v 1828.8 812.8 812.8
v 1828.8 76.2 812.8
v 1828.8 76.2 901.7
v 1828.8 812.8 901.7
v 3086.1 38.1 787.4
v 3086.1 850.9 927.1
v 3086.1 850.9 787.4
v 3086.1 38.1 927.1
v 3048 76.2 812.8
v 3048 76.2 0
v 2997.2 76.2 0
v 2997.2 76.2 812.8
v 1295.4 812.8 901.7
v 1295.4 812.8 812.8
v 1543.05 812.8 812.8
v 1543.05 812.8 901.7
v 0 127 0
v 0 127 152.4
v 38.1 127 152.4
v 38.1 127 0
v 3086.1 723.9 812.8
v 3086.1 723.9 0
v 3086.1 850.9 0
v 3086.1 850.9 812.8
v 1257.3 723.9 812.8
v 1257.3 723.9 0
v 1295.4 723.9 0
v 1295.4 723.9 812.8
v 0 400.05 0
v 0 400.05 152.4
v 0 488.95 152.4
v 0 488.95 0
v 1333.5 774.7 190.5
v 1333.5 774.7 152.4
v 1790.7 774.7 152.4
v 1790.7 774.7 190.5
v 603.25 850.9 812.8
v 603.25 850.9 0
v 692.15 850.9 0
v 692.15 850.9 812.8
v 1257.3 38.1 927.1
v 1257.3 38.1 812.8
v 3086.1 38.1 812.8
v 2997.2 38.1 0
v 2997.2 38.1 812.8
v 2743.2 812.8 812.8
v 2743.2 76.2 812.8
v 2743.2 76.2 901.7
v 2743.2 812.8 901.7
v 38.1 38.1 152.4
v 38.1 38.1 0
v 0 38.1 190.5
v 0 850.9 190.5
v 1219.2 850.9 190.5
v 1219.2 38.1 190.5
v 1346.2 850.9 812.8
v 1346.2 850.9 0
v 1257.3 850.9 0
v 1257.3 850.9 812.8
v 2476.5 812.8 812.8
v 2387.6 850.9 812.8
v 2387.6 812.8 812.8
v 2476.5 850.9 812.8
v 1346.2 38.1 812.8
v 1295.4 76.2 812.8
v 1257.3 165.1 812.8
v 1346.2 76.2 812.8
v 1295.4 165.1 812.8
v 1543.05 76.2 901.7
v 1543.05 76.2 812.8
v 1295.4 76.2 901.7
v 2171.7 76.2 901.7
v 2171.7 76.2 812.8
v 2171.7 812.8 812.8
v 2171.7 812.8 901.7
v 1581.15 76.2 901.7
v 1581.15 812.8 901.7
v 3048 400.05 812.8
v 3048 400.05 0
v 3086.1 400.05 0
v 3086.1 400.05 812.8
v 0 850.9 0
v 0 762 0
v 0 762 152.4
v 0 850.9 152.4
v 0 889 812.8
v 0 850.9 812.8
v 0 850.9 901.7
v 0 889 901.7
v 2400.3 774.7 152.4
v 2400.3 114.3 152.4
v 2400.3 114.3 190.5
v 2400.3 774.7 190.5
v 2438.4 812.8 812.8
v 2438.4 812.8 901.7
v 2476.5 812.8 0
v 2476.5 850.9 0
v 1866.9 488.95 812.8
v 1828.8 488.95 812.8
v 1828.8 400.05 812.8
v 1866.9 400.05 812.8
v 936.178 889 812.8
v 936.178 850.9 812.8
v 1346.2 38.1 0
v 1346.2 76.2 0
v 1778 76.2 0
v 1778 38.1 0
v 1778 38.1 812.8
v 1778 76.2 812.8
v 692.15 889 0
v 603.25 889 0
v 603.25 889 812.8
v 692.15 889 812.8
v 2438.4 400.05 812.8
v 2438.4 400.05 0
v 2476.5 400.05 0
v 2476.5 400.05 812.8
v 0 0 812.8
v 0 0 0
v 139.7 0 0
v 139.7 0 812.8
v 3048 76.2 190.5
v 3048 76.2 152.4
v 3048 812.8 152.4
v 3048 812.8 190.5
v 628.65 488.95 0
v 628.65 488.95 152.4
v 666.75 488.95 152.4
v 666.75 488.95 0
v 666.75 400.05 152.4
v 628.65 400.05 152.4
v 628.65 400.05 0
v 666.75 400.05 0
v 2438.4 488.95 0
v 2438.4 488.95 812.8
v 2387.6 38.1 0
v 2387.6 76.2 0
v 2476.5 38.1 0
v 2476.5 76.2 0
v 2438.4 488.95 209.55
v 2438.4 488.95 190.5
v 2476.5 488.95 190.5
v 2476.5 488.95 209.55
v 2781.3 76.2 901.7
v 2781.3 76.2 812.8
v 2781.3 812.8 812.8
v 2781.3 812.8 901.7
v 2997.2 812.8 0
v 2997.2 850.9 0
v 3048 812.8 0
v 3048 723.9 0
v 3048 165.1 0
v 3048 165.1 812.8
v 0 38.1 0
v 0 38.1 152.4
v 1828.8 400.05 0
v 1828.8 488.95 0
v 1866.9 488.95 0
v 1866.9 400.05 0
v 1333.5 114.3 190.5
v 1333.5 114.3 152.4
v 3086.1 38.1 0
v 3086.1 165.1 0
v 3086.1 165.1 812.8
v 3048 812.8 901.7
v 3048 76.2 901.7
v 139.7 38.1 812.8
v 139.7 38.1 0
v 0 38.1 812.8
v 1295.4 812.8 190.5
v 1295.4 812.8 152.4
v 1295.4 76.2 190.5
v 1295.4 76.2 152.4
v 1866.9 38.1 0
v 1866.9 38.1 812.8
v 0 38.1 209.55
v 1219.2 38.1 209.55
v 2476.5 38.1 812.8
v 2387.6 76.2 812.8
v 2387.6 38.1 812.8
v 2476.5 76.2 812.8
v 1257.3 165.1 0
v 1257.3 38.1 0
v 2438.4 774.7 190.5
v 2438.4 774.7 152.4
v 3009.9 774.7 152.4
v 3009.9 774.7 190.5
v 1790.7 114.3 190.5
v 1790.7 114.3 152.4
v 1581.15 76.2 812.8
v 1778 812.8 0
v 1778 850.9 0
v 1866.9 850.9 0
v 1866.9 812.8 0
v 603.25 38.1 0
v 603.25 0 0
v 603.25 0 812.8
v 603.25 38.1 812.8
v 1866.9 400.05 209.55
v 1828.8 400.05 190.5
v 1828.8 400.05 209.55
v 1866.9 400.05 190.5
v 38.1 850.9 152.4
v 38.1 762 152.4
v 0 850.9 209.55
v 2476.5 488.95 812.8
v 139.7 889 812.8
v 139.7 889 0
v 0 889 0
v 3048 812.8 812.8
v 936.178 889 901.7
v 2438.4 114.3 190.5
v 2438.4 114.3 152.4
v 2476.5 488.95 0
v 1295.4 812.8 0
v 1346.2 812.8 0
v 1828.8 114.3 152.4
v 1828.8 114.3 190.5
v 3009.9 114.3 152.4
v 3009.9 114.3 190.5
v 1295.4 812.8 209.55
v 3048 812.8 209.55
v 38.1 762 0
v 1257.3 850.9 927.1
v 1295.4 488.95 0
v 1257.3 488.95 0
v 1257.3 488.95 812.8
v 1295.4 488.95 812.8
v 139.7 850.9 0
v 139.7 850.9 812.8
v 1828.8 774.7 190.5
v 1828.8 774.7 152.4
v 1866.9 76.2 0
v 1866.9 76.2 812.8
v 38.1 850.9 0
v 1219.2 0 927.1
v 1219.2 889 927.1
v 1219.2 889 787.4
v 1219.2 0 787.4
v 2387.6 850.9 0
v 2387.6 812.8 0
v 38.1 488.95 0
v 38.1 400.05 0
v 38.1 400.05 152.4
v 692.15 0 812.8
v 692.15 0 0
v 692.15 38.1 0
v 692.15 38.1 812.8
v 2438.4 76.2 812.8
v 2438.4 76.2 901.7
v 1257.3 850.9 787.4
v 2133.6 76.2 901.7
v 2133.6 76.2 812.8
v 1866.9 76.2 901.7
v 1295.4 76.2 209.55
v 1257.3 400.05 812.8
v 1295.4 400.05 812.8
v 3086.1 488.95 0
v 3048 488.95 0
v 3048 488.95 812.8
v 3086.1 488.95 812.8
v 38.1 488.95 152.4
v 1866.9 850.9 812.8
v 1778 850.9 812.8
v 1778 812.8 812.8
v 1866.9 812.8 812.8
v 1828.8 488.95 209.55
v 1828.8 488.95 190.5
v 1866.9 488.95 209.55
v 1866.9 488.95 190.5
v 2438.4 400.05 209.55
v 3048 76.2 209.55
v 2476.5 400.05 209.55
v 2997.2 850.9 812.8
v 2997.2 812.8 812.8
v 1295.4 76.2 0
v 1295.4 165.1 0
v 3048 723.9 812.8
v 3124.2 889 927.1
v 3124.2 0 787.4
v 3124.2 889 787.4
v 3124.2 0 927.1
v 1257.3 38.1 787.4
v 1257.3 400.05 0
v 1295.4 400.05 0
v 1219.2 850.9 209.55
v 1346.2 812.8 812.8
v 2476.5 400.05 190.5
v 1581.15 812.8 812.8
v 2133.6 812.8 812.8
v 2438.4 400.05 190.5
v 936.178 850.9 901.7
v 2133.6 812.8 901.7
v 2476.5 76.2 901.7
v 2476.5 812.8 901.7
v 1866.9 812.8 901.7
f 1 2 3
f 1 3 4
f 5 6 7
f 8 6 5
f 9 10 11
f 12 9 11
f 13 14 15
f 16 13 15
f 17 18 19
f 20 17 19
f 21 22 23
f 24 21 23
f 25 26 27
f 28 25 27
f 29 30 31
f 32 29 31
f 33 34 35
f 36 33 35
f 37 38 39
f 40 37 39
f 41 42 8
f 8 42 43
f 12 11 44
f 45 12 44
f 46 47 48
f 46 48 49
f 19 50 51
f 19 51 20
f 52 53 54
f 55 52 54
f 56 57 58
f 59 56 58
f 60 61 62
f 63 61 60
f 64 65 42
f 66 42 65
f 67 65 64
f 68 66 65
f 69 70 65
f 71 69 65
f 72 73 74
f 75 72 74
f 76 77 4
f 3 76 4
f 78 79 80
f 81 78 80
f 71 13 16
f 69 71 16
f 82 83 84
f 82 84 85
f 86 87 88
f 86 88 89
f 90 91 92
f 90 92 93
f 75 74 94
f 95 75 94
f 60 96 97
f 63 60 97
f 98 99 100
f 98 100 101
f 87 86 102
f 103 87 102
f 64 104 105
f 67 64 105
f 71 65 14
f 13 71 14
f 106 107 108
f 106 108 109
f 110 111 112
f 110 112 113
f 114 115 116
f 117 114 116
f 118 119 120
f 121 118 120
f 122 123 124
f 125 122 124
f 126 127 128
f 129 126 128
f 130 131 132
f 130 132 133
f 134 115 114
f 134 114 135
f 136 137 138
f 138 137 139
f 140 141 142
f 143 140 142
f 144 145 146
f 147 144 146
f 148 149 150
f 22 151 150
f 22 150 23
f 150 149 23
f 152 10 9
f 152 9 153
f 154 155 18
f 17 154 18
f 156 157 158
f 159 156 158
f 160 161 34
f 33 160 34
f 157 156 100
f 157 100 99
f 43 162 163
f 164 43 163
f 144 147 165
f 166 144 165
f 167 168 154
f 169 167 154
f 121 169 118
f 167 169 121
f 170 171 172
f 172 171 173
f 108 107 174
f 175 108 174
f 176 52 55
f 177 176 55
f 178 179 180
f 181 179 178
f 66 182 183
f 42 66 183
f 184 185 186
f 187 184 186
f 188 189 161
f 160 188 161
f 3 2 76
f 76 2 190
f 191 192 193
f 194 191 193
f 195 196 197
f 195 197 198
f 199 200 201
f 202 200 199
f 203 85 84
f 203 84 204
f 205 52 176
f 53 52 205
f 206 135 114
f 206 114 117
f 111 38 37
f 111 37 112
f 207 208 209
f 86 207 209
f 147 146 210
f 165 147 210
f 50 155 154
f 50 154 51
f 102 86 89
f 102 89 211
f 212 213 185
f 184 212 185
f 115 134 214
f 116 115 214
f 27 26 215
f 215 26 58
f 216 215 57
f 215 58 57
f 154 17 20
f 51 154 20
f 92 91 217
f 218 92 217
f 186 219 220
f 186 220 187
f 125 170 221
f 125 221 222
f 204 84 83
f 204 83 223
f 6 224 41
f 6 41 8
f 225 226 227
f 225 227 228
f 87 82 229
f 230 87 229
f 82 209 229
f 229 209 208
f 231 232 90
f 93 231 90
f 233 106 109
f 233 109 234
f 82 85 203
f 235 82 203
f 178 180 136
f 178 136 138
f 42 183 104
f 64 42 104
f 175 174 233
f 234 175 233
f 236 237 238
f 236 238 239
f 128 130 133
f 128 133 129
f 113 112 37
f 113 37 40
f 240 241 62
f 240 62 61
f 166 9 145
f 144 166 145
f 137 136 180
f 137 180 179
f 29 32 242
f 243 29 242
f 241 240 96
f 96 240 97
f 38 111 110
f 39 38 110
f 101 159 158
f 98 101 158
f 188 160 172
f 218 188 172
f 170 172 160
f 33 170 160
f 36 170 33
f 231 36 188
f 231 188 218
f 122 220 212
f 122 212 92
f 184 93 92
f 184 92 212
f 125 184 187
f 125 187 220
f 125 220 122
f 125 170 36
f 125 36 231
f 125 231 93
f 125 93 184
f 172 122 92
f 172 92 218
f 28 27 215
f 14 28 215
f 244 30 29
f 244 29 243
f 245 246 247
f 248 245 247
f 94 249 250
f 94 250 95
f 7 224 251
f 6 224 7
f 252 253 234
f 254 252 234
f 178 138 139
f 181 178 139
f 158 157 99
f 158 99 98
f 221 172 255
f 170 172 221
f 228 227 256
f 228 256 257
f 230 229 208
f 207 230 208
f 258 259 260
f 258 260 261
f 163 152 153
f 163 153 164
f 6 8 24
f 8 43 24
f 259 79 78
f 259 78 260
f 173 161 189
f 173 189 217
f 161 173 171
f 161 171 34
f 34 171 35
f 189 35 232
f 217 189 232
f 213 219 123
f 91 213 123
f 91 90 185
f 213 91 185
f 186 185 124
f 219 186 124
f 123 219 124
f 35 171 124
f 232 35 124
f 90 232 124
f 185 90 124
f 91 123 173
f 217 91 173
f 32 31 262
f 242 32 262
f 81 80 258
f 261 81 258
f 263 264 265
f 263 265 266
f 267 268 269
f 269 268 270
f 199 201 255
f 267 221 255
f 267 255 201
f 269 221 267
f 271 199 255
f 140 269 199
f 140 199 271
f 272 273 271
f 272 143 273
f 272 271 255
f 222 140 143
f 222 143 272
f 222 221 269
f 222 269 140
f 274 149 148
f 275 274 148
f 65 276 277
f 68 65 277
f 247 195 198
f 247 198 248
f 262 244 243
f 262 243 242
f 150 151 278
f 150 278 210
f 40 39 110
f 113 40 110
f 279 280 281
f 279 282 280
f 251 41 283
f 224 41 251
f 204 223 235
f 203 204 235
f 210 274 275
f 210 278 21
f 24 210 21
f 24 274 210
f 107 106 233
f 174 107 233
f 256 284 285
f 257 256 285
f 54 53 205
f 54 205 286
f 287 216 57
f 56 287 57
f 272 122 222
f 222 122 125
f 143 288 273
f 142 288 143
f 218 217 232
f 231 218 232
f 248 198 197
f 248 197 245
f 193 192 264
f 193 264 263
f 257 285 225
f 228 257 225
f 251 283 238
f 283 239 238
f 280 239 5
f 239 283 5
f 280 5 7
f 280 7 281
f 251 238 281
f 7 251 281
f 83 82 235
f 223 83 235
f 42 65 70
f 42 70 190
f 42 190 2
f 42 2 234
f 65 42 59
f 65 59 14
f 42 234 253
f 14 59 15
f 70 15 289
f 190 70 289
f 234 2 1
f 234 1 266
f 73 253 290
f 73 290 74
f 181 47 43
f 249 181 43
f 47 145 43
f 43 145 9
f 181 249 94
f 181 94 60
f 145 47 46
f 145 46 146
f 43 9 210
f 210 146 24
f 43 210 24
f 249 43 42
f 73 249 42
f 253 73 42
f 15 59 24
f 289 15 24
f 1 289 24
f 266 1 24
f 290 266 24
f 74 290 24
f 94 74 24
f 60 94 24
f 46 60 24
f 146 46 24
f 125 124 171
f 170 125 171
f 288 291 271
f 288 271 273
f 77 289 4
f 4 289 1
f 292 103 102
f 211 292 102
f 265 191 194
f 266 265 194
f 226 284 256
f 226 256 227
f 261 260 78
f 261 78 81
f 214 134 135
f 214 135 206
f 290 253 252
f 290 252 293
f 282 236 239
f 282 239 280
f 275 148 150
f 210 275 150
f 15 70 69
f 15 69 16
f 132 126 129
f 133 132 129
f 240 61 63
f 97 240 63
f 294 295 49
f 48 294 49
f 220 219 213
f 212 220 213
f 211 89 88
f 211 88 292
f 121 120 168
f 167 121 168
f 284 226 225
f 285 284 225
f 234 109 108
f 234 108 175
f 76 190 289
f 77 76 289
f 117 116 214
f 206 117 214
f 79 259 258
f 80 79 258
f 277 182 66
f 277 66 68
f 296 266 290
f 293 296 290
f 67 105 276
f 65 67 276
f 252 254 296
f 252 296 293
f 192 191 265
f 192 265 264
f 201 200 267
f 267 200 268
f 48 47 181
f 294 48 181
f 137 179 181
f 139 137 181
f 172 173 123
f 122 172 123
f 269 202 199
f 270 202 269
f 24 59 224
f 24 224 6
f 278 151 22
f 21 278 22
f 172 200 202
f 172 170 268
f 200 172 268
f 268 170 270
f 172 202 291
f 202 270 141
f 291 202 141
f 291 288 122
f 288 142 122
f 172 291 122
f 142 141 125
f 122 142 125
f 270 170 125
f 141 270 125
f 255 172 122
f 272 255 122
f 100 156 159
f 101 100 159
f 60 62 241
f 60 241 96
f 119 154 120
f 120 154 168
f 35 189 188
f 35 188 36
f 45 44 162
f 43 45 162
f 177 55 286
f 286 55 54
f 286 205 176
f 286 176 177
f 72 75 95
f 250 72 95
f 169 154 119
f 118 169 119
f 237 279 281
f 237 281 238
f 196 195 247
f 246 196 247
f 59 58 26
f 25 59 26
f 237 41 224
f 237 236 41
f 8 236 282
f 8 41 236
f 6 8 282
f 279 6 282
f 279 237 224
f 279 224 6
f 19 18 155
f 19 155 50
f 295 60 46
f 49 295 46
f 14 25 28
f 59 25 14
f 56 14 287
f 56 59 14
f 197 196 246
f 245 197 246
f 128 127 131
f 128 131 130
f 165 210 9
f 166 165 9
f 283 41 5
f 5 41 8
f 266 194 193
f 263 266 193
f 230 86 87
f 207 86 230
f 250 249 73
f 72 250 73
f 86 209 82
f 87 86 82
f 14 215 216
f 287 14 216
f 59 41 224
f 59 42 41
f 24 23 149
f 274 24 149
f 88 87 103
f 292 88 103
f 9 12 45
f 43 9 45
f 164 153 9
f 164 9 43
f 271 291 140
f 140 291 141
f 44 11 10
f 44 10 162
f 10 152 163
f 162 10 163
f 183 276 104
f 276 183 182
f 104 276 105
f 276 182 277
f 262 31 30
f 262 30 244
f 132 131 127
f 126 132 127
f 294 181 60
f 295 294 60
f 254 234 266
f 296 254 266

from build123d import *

# Parameters (mm, degrees)
F2_W           = 88.9
F2_H           = 38.1
F3_DEPTH       = 812.8
F2_W_2         = 38.1
F2_H_2         = 88.9
F4_DEPTH       = 152.4
F5_W           = 38.1
F5_H           = 660.4
F6_DEPTH       = 38.1
F7_W           = 1752.6
F7_H           = 736.6
F7_W_2         = 38.1
F7_H_2         = 88.9
F8_DEPTH       = 19.05
F7_W_3         = 1219.2
F7_H_3         = 812.8
F9_W           = 38.1
F9_H           = 736.6
F10_DEPTH      = 88.9
F9_W_2         = 936.1780285835
F9_H_2         = 38.1
F11_W          = 1828.8
F11_H          = 38.1
F12_DEPTH      = 25.4
F12_DEPTH_BACK = 114.3
F13_W          = 1828.8
F13_H          = 812.8
F14_DEPTH      = 19.05
F15_W          = 1828.8
F15_H          = 812.8
F16_DEPTH      = 6.35


# Not quite as in the source:
# - a feature names something its author has since deleted; it is built from what else it names


with BuildPart() as f3:
    # F2 (on Top) → F3 (new body)
    with BuildSketch(Plane.XY):
        with Locations((2432.05, 831.85)):
            Rectangle(F2_W, F2_H)
    extrude(amount=F3_DEPTH)


with BuildPart() as f3b:
    # F2 (on Top) → F3, piece 2 (new body)
    with BuildSketch(Plane.XY):
        with Locations((1822.45, 831.85)):
            Rectangle(F2_W, F2_H)
    extrude(amount=F3_DEPTH)


with BuildPart() as f3c:
    # F2 (on Top) → F3, piece 3 (new body)
    with BuildSketch(Plane.XY):
        with Locations((647.7, 869.95)):
            Rectangle(F2_W, F2_H)
    extrude(amount=F3_DEPTH)


with BuildPart() as f3d:
    # F2 (on Top) → F3, piece 4 (new body)
    with BuildSketch(Plane.XY):
        with Locations((1822.45, 57.15)):
            Rectangle(F2_W, F2_H)
    extrude(amount=F3_DEPTH)


with BuildPart() as f3e:
    # F2 (on Top) → F3, piece 5 (new body)
    with BuildSketch(Plane.XY):
        with Locations((647.7, 19.05)):
            Rectangle(F2_W, F2_H)
    extrude(amount=F3_DEPTH)


with BuildPart() as f3f:
    # F2 (on Top) → F3, piece 6 (new body)
    with BuildSketch(Plane.XY):
        with Locations((2432.05, 57.15)):
            Rectangle(F2_W, F2_H)
    extrude(amount=F3_DEPTH)


with BuildPart() as f3g:
    # F2 (on Top) → F3, piece 7 (new body)
    with BuildSketch(Plane.XY):
        with Locations((2457.45, 444.5)):
            Rectangle(F2_W_2, F2_H_2)
    extrude(amount=F3_DEPTH)


with BuildPart() as f3h:
    # F2 (on Top) → F3, piece 8 (new body)
    with BuildSketch(Plane.XY):
        with Locations((3067.05, 444.5)):
            Rectangle(F2_W_2, F2_H_2)
    extrude(amount=F3_DEPTH)


with BuildPart() as f3i:
    # F2 (on Top) → F3, piece 9 (new body)
    with BuildSketch(Plane.XY):
        with Locations((1847.85, 444.5)):
            Rectangle(F2_W_2, F2_H_2)
    extrude(amount=F3_DEPTH)


with BuildPart() as f3j:
    # F2 (on Top) → F3, piece 10 (new body)
    with BuildSketch(Plane.XY):
        with Locations((1276.35, 444.5)):
            Rectangle(F2_W_2, F2_H_2)
    extrude(amount=F3_DEPTH)


with BuildPart() as f3k:
    # F2 (on Top) → F3, piece 11 (new body)
    with BuildSketch(Plane.XY):
        Polygon((3048, 812.8), (3086.1, 812.8), (3086.1, 850.9), (2997.2, 850.9), (2997.2, 812.8), align=None)
        with Locations((3067.05, 768.35)):
            Rectangle(F2_W_2, F2_H_2)
    extrude(amount=F3_DEPTH)


with BuildPart() as f3l:
    # F2 (on Top) → F3, piece 12 (new body)
    with BuildSketch(Plane.XY):
        Polygon((1346.2, 812.8), (1346.2, 850.9), (1257.3, 850.9), (1257.3, 812.8), (1295.4, 812.8), align=None)
        with Locations((1276.35, 768.35)):
            Rectangle(F2_W_2, F2_H_2)
    extrude(amount=F3_DEPTH)


with BuildPart() as f3m:
    # F2 (on Top) → F3, piece 13 (new body)
    with BuildSketch(Plane.XY):
        Polygon((139.7, 889), (0, 889), (0, 850.9), (38.1, 850.9), (139.7, 850.9), align=None)
    extrude(amount=F3_DEPTH)


with BuildPart() as f3n:
    # F2 (on Top) → F3, piece 14 (new body)
    with BuildSketch(Plane.XY):
        Polygon((38.1, 38.1), (0, 38.1), (0, 0), (139.7, 0), (139.7, 38.1), align=None)
    extrude(amount=F3_DEPTH)


with BuildPart() as f3o:
    # F2 (on Top) → F3, piece 15 (new body)
    with BuildSketch(Plane.XY):
        Polygon((3086.1, 38.1), (3086.1, 76.2), (3048, 76.2), (2997.2, 76.2), (2997.2, 38.1), align=None)
        with Locations((3067.05, 120.65)):
            Rectangle(F2_W_2, F2_H_2)
    extrude(amount=F3_DEPTH)


with BuildPart() as f3p:
    # F2 (on Top) → F3, piece 16 (new body)
    with BuildSketch(Plane.XY):
        with Locations((1276.35, 120.65)):
            Rectangle(F2_W_2, F2_H_2)
        Polygon((1295.4, 76.2), (1257.3, 76.2), (1257.3, 38.1), (1346.2, 38.1), (1346.2, 76.2), align=None)
    extrude(amount=F3_DEPTH)


with BuildPart() as f4:
    # F2 (on Top) → F4 (new body)
    with BuildSketch(Plane.XY):
        with Locations((19.05, 444.5)):
            Rectangle(F2_W_2, F2_H_2)
    extrude(amount=F4_DEPTH)


with BuildPart() as f4b:
    # F2 (on Top) → F4, piece 2 (new body)
    with BuildSketch(Plane.XY):
        with Locations((647.7, 444.5)):
            Rectangle(F2_W_2, F2_H_2)
    extrude(amount=F4_DEPTH)


with BuildPart() as f4c:
    # F2 (on Top) → F4, piece 3 (new body)
    with BuildSketch(Plane.XY):
        with Locations((19.05, 806.45)):
            Rectangle(F2_W_2, F2_H_2)
    extrude(amount=F4_DEPTH)


with BuildPart() as f4d:
    # F2 (on Top) → F4, piece 4 (new body)
    with BuildSketch(Plane.XY):
        with Locations((19.05, 82.55)):
            Rectangle(F2_W_2, F2_H_2)
    extrude(amount=F4_DEPTH)


with BuildPart() as f6:
    # F5 (on offset) → F6 (new body)
    with BuildSketch(Plane.XY.offset(152.4)):
        Polygon((3048, 812.8), (1295.4, 812.8), (1295.4, 774.7), (1333.5, 774.7), (1790.7, 774.7), (1828.8, 774.7), (2400.3, 774.7), (2438.4, 774.7), (3009.9, 774.7), (3048, 774.7), align=None)
        with Locations((1314.45, 444.5)):
            Rectangle(F5_W, F5_H)
        with Locations((3028.95, 444.5)):
            Rectangle(F5_W, F5_H)
        Polygon((1333.5, 114.3), (1295.4, 114.3), (1295.4, 76.2), (3048, 76.2), (3048, 114.3), (3009.9, 114.3), (2438.4, 114.3), (2400.3, 114.3), (1828.8, 114.3), (1790.7, 114.3), align=None)
        with Locations((1809.75, 444.5)):
            Rectangle(F5_W, F5_H)
        with Locations((2419.35, 444.5)):
            Rectangle(F5_W, F5_H)
    extrude(amount=F6_DEPTH)


with BuildPart() as f8:
    # F7 (on face) → F8 (new body)
    with BuildSketch(Plane.XY.offset(190.5)):
        with Locations((2171.7, 444.5)):
            Rectangle(F7_W, F7_H)
        with Locations((1847.85, 444.5)):
            Rectangle(F7_W_2, F7_H_2, mode=Mode.SUBTRACT)
        with Locations((2457.45, 444.5)):
            Rectangle(F7_W_2, F7_H_2, mode=Mode.SUBTRACT)
    extrude(amount=F8_DEPTH)


with BuildPart() as f8b:
    # F7 (on face) → F8, piece 2 (new body)
    with BuildSketch(Plane.XY.offset(190.5)):
        with Locations((609.6, 444.5)):
            Rectangle(F7_W_3, F7_H_3)
    extrude(amount=F8_DEPTH)


with BuildPart() as f10:
    # F9 (on face) → F10 (new body)
    with BuildSketch(Plane.XY.offset(812.8)):
        Polygon((3048, 850.9), (1295.4, 850.9), (1295.4, 812.8), (1543.05, 812.8), (1581.15, 812.8), (1828.8, 812.8), (1866.9, 812.8), (2133.6, 812.8), (2171.7, 812.8), (2438.4, 812.8), (2476.5, 812.8), (2743.2, 812.8), (2781.3, 812.8), (3048, 812.8), align=None)
        Polygon((1295.4, 812.8), (1295.4, 850.9), (1257.3, 850.9), (1257.3, 38.1), (1295.4, 38.1), (1295.4, 76.2), align=None)
        Polygon((3086.1, 850.9), (3048, 850.9), (3048, 812.8), (3048, 76.2), (3048, 38.1), (3086.1, 38.1), align=None)
        Polygon((1543.05, 76.2), (1295.4, 76.2), (1295.4, 38.1), (3048, 38.1), (3048, 76.2), (2781.3, 76.2), (2743.2, 76.2), (2476.5, 76.2), (2438.4, 76.2), (2171.7, 76.2), (2133.6, 76.2), (1866.9, 76.2), (1828.8, 76.2), (1581.15, 76.2), align=None)
        with Locations((1562.1, 444.5)):
            Rectangle(F9_W, F9_H)
        with Locations((1847.85, 444.5)):
            Rectangle(F9_W, F9_H)
        with Locations((2152.65, 444.5)):
            Rectangle(F9_W, F9_H)
        with Locations((2457.45, 444.5)):
            Rectangle(F9_W, F9_H)
        with Locations((2762.25, 444.5)):
            Rectangle(F9_W, F9_H)
    extrude(amount=F10_DEPTH)

    # F13 (on face) → F14 (join)
    with BuildSketch(Plane.XY.offset(901.7)):
        with Locations((2171.7, 444.5)):
            Rectangle(F13_W, F13_H)
    extrude(amount=F14_DEPTH)

    # F15 (on face) → F16 (join)
    with BuildSketch(Plane.XY.offset(920.75)):
        with Locations((2171.7, 444.5)):
            Rectangle(F15_W, F15_H)
    extrude(amount=F16_DEPTH)


with BuildPart() as f10b:
    # F9 (on face) → F10, piece 2 (new body)
    with BuildSketch(Plane.XY.offset(812.8)):
        with Locations((468.0890142918, 869.95)):
            Rectangle(F9_W_2, F9_H_2)
    extrude(amount=F10_DEPTH)


with BuildPart() as f12:
    # F11 (on face) → F12 (new body, two sides)
    with BuildSketch(Plane.XY.offset(901.7)) as f12_sk:
        with Locations((2171.7, 869.95)):
            Rectangle(F11_W, F11_H)
        Polygon((3124.2, 889), (3086.1, 889), (3086.1, 850.9), (3086.1, 38.1), (3086.1, 0), (3124.2, 0), align=None)
        Polygon((1257.3, 850.9), (1257.3, 889), (1219.2, 889), (1219.2, 0), (1257.3, 0), (1257.3, 38.1), align=None)
        with Locations((2171.7, 19.05)):
            Rectangle(F11_W, F11_H)
    extrude(amount=F12_DEPTH)
    extrude(f12_sk.sketch, amount=-F12_DEPTH_BACK)


solid = Compound([f3.part, f3b.part, f3c.part, f3d.part, f3e.part, f3f.part, f3g.part, f3h.part, f3i.part, f3j.part, f3k.part, f3l.part, f3m.part, f3n.part, f3o.part, f3p.part, f4.part, f4b.part, f4c.part, f4d.part, f6.part, f8.part, f8b.part, f10.part, f10b.part, f12.part])
